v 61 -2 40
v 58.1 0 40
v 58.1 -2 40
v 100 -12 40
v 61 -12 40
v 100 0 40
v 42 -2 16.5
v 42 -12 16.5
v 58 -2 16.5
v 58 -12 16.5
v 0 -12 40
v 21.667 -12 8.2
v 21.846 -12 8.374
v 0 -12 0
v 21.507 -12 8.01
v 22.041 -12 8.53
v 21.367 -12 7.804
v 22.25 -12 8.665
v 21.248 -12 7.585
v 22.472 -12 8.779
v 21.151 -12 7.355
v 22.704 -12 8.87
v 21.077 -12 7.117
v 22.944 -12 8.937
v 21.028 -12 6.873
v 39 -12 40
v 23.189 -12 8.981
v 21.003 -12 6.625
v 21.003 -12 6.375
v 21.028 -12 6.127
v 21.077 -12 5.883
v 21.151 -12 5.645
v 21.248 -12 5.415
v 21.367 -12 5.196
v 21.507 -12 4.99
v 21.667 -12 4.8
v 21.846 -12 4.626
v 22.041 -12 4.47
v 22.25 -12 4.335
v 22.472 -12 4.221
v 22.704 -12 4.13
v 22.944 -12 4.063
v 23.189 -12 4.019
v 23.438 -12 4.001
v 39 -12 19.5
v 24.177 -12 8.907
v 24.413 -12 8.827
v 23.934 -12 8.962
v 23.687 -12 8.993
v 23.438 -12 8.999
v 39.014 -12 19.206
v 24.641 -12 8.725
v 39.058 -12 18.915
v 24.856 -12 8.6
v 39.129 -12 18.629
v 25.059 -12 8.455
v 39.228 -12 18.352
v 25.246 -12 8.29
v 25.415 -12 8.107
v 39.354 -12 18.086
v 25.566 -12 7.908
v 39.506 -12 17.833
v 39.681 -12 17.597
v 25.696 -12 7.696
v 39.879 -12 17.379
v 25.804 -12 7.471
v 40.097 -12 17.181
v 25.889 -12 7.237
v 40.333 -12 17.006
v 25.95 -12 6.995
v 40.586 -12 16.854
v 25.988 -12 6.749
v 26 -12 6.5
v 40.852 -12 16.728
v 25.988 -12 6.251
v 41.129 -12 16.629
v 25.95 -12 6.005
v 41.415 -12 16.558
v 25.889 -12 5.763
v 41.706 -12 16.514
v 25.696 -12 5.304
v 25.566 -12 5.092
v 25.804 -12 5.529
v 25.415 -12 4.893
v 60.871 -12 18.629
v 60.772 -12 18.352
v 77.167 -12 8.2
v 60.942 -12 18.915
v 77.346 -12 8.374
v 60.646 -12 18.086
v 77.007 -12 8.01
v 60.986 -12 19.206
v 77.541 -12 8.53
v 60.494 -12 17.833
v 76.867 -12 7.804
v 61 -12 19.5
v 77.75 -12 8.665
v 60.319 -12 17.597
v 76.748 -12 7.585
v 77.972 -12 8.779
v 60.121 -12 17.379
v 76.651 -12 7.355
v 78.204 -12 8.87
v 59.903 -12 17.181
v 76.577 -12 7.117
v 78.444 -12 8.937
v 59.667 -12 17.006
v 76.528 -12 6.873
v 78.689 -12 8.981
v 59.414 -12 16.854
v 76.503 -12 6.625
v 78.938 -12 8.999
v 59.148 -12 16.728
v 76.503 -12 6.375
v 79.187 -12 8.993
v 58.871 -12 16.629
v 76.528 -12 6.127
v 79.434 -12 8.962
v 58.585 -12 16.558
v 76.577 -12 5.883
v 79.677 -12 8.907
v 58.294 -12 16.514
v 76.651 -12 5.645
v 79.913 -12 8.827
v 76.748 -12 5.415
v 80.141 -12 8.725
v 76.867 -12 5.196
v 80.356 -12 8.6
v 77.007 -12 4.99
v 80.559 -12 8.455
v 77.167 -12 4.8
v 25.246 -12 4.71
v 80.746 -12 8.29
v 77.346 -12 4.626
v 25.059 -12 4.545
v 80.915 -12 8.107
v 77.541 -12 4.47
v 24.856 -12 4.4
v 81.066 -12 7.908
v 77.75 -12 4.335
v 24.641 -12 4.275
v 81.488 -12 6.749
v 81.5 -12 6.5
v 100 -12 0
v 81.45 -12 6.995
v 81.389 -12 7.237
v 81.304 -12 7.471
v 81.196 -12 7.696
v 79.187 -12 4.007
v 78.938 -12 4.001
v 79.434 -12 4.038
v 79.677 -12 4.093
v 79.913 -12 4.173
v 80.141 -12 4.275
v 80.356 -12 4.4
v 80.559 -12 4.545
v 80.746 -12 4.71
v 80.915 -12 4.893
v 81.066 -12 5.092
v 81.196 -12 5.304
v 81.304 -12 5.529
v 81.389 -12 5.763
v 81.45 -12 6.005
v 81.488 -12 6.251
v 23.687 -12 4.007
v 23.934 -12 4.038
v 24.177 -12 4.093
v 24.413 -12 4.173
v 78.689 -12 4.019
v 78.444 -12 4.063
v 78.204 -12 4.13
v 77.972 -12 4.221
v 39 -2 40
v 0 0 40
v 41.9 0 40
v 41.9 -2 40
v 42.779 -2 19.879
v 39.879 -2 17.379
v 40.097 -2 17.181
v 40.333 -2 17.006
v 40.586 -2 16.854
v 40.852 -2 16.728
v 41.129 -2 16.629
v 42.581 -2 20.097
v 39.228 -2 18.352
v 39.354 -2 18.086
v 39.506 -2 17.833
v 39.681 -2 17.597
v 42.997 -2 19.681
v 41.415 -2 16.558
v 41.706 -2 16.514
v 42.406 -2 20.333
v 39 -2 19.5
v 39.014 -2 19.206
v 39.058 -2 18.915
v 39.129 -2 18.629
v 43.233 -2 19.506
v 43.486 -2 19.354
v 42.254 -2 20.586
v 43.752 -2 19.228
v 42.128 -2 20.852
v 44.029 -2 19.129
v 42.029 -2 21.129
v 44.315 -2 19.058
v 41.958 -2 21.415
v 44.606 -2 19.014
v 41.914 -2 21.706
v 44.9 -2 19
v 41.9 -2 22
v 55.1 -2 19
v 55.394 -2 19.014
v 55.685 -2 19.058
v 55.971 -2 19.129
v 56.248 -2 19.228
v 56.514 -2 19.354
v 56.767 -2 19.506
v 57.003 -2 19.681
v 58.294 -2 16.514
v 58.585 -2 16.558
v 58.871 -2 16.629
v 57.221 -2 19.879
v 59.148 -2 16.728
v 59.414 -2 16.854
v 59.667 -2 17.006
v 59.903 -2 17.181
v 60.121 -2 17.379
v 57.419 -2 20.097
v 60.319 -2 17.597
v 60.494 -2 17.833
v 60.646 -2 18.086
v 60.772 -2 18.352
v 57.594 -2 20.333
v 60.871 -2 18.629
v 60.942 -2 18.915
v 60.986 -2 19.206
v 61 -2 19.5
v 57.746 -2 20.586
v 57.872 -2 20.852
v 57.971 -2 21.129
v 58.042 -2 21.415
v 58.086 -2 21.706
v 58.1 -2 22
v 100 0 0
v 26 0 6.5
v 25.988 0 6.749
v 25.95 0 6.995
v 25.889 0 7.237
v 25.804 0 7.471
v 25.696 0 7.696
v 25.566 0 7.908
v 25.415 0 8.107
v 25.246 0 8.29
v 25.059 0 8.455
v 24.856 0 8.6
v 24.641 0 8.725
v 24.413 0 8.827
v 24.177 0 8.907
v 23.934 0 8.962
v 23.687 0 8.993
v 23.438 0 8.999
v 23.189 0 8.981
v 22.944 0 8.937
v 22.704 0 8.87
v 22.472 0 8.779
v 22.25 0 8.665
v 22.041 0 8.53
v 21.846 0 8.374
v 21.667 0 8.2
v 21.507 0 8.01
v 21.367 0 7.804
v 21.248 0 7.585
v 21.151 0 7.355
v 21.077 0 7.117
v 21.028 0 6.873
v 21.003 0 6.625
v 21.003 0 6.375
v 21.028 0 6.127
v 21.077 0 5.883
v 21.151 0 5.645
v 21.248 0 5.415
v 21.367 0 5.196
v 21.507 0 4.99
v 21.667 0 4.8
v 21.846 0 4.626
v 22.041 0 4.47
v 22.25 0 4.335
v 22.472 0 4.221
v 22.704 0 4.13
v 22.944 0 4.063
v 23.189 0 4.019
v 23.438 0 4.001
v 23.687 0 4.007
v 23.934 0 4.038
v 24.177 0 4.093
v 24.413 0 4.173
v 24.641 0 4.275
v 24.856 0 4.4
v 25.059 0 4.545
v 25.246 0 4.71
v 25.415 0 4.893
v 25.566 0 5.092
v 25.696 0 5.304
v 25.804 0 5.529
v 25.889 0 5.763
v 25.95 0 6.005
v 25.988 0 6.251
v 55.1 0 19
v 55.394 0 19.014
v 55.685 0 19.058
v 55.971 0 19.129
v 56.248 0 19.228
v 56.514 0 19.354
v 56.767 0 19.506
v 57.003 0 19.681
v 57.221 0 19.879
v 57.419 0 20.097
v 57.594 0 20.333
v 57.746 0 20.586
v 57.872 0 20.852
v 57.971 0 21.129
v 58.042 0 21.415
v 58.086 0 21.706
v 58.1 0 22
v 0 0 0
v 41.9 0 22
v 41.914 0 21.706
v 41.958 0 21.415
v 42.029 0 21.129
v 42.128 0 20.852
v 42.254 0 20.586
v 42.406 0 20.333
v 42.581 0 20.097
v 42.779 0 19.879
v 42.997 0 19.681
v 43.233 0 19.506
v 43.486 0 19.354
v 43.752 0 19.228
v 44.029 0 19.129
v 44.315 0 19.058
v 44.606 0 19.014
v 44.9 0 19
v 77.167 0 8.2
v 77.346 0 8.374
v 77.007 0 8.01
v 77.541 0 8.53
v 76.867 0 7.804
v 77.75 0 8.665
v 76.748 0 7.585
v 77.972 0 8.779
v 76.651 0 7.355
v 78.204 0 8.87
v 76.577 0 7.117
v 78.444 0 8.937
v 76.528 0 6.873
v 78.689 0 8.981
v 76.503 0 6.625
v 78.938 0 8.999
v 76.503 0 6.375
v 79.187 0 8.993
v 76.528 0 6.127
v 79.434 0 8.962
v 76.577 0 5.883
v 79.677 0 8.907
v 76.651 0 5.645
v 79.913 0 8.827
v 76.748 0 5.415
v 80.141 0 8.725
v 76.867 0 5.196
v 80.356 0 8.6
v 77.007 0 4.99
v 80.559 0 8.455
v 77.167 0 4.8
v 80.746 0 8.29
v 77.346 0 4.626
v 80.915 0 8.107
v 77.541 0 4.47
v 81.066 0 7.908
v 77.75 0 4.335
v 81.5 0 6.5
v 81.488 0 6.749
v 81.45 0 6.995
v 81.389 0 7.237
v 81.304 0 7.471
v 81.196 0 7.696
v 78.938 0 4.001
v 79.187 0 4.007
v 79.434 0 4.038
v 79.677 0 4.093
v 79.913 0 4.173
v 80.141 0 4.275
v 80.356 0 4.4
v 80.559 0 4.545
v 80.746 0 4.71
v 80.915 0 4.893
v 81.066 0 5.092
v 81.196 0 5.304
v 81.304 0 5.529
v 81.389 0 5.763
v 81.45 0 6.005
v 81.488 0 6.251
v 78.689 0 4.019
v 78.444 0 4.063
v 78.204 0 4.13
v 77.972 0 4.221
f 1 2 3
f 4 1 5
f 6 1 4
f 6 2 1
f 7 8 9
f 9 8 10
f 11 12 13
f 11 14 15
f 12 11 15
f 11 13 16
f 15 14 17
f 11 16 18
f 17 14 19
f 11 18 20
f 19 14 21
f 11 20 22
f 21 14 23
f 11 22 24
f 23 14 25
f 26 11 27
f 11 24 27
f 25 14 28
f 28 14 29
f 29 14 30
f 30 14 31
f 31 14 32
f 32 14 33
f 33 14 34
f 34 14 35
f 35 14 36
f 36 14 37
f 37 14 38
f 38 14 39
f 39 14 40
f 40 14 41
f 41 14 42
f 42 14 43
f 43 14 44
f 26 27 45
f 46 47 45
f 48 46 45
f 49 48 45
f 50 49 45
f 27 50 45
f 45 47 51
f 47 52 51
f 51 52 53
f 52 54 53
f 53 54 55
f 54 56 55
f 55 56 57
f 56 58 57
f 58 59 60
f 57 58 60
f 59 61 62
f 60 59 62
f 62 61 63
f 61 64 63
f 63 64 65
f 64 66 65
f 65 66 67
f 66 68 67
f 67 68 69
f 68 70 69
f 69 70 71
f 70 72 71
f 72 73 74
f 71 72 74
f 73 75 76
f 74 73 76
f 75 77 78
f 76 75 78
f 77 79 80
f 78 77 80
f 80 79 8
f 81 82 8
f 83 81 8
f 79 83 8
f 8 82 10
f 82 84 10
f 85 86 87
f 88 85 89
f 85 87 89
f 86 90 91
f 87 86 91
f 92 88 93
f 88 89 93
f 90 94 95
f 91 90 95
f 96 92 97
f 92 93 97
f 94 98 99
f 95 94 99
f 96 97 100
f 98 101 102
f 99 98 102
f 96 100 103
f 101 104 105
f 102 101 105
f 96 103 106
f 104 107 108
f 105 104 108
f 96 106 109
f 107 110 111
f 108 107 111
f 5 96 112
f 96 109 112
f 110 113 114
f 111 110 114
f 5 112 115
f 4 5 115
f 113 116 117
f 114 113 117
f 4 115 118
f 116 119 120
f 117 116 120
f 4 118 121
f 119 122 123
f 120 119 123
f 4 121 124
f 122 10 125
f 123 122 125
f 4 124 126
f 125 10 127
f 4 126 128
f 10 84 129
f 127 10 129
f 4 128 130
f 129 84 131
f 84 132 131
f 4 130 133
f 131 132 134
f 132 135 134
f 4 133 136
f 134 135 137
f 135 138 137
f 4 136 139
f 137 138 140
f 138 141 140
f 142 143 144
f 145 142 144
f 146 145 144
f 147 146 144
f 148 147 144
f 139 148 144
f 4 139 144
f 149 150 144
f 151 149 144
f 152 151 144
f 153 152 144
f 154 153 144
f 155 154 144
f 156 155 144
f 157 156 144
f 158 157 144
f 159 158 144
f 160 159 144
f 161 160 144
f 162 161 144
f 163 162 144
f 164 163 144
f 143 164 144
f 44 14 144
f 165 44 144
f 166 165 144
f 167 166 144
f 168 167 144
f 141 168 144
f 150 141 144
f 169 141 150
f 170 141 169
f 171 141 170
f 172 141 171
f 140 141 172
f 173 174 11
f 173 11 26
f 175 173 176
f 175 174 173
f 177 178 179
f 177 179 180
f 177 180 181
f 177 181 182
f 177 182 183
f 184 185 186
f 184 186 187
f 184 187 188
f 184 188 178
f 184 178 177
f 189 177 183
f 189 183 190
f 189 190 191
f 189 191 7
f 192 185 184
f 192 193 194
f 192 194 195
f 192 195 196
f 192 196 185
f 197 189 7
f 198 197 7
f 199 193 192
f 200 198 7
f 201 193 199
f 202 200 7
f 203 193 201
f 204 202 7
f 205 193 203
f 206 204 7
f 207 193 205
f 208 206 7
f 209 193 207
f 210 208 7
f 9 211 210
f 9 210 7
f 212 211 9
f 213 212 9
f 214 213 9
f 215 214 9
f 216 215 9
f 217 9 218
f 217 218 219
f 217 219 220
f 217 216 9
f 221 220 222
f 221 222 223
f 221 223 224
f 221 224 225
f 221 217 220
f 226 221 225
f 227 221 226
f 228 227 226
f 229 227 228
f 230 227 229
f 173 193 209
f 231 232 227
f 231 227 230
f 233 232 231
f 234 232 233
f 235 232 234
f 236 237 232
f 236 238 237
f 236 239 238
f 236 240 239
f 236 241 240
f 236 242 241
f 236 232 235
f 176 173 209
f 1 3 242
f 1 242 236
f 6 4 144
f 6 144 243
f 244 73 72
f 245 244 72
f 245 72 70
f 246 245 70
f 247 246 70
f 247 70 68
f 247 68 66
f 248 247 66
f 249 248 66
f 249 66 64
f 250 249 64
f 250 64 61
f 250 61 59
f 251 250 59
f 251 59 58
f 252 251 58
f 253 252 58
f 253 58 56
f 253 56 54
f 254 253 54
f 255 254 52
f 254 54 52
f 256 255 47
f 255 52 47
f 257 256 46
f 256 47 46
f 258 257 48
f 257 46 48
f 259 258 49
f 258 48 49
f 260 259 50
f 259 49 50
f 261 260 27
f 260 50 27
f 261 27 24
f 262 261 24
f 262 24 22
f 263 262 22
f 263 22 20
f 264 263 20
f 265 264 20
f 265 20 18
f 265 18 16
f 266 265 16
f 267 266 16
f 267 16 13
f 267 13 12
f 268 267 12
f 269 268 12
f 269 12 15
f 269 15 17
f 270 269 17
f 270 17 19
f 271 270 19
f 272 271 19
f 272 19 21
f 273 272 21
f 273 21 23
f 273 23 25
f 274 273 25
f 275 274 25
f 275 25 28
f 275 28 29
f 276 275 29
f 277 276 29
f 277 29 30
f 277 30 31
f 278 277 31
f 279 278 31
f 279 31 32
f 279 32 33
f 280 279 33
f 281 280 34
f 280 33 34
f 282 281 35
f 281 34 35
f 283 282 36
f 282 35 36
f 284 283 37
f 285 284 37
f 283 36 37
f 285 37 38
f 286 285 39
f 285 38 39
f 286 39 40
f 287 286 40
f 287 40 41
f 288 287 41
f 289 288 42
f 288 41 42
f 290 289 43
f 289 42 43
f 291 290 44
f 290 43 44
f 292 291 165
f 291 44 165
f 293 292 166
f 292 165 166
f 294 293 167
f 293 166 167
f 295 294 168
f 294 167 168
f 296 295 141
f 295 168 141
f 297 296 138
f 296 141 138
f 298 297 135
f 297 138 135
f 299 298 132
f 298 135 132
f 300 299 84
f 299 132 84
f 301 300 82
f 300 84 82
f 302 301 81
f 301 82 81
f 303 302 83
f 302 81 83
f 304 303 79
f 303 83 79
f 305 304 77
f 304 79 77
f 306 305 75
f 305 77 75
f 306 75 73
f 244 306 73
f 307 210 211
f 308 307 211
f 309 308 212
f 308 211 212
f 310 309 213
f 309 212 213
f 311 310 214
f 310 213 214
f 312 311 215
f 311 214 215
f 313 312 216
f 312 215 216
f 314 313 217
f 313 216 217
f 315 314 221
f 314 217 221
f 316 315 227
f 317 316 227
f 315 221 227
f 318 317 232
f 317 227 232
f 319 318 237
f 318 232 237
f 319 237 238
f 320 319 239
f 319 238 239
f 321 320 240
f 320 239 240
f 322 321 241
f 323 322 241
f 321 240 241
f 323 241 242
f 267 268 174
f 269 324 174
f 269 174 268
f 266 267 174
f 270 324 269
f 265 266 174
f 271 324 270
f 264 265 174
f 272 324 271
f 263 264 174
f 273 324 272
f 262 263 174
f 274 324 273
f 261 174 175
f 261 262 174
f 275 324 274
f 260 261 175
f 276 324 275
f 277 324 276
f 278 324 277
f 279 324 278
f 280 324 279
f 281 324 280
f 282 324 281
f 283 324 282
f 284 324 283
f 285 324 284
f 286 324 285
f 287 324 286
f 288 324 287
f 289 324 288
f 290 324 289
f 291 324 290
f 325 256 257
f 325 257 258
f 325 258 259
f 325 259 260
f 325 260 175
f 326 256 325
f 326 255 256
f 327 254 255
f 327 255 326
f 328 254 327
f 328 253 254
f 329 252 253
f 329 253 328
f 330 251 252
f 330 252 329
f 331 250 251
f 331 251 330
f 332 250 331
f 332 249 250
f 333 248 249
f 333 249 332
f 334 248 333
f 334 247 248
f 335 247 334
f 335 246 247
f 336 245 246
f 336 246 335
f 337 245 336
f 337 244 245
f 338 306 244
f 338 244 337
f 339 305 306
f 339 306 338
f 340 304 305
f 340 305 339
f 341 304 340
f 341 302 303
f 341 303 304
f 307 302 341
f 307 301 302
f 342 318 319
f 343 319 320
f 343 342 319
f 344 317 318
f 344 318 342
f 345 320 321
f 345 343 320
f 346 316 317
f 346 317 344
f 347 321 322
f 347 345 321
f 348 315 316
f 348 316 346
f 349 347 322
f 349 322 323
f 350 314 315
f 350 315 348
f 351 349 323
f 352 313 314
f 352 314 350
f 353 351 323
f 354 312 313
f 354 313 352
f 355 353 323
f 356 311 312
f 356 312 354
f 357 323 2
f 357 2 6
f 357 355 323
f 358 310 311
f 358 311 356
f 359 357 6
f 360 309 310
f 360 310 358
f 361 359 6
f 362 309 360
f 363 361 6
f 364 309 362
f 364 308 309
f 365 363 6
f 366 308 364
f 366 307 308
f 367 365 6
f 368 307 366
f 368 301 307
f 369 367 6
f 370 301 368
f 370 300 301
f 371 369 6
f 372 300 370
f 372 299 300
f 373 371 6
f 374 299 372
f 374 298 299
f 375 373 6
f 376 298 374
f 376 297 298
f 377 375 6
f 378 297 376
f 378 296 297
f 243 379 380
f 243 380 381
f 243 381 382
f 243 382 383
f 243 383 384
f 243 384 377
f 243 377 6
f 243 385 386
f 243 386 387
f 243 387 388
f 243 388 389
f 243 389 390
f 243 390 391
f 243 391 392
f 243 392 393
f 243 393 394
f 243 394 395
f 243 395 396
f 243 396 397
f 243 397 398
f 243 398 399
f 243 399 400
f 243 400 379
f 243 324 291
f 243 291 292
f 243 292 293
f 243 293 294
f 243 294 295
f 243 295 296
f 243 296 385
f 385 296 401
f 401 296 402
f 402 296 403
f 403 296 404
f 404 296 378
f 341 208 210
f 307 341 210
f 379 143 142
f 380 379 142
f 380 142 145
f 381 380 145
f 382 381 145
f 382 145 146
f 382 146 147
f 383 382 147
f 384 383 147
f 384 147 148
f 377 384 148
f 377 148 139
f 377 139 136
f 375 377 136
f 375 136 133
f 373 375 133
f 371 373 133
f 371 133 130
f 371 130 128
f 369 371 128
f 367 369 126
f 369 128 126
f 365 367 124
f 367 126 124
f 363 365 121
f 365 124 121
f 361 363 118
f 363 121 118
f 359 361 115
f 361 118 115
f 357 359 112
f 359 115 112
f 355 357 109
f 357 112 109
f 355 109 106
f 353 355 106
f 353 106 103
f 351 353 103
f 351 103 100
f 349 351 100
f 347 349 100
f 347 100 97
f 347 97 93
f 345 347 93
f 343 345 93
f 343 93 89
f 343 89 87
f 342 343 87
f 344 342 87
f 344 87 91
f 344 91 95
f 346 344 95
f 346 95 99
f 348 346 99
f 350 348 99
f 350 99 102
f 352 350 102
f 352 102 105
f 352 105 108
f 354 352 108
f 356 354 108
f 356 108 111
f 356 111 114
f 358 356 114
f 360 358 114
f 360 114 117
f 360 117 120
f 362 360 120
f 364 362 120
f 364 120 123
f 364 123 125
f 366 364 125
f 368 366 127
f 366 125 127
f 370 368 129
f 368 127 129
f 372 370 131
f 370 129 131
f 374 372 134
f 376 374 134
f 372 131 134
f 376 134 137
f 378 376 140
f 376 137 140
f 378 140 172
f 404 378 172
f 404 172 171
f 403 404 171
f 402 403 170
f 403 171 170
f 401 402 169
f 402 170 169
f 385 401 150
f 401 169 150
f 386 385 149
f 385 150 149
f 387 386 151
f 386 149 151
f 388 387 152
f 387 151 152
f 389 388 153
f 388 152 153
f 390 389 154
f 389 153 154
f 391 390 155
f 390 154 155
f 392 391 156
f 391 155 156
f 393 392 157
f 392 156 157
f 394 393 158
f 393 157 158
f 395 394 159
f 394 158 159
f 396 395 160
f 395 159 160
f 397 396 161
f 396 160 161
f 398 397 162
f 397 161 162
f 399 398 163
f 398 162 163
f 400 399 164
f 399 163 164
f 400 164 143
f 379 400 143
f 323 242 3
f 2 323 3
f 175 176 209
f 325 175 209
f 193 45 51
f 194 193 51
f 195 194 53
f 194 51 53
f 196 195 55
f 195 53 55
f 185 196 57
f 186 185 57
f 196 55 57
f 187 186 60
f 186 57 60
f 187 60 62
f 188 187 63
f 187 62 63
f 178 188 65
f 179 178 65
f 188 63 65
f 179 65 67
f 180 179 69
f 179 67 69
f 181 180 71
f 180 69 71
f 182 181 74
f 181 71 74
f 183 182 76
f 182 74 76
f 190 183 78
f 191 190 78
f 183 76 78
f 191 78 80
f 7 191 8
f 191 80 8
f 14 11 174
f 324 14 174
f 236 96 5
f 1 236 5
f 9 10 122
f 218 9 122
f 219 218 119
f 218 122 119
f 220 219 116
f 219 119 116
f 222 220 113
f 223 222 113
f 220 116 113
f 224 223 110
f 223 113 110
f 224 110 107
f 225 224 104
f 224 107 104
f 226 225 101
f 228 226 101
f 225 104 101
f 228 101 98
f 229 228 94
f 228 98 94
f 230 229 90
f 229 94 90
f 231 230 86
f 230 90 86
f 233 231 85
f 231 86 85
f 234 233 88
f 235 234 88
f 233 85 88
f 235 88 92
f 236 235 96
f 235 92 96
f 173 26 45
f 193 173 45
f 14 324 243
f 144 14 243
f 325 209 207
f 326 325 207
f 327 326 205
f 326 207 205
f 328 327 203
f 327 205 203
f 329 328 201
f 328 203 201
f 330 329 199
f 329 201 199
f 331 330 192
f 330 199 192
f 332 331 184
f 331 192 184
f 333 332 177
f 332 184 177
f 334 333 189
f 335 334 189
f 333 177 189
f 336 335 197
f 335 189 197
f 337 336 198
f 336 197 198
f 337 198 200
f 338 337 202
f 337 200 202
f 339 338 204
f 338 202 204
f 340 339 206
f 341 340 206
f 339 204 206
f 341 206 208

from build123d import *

# Parameters (mm, degrees)
F0_W     = 100
F0_H     = 12
F1_DEPTH = 40
F2_R     = 2.5
F3_DEPTH = 25
F5_DEPTH = 10
F7_DEPTH = 25


with BuildPart() as f1:
    # F0 (on Top) → F1 (new body)
    with BuildSketch(Plane.XY):
        with Locations((50, -6)):
            Rectangle(F0_W, F0_H)
    extrude(amount=F1_DEPTH)

    # F2 (on face) → F3 (cut)
    with BuildSketch(Plane.XZ.offset(12)):
        with Locations((79, 6.5)):
            Circle(F2_R)
        with Locations((23.5, 6.5)):
            Circle(F2_R)
    extrude(amount=-F3_DEPTH, mode=Mode.SUBTRACT)

    # F4 (on face) → F5 (cut)
    with BuildSketch(Plane.XZ.offset(12)):
        with BuildLine():
            Line((61, 40), (39, 40))
            Line((39, 40), (39, 19.5))
            ThreePointArc((39, 19.5), (39.87868, 17.37868), (42, 16.5))
            Line((42, 16.5), (58, 16.5))
            ThreePointArc((58, 16.5), (60.12132, 17.37868), (61, 19.5))
            Line((61, 19.5), (61, 40))
        make_face()
    extrude(amount=-F5_DEPTH, mode=Mode.SUBTRACT)

    # F6 (on face) → F7 (cut)
    with BuildSketch(Plane.XZ.offset(2)):
        with BuildLine():
            Line((58.1, 40), (41.9, 40))
            Line((41.9, 40), (41.9, 22))
            ThreePointArc((41.9, 22), (42.77868, 19.87868), (44.9, 19))
            Line((44.9, 19), (55.1, 19))
            ThreePointArc((55.1, 19), (57.22132, 19.87868), (58.1, 22))
            Line((58.1, 22), (58.1, 40))
        make_face()
    extrude(amount=-F7_DEPTH, mode=Mode.SUBTRACT)


solid = f1.part
